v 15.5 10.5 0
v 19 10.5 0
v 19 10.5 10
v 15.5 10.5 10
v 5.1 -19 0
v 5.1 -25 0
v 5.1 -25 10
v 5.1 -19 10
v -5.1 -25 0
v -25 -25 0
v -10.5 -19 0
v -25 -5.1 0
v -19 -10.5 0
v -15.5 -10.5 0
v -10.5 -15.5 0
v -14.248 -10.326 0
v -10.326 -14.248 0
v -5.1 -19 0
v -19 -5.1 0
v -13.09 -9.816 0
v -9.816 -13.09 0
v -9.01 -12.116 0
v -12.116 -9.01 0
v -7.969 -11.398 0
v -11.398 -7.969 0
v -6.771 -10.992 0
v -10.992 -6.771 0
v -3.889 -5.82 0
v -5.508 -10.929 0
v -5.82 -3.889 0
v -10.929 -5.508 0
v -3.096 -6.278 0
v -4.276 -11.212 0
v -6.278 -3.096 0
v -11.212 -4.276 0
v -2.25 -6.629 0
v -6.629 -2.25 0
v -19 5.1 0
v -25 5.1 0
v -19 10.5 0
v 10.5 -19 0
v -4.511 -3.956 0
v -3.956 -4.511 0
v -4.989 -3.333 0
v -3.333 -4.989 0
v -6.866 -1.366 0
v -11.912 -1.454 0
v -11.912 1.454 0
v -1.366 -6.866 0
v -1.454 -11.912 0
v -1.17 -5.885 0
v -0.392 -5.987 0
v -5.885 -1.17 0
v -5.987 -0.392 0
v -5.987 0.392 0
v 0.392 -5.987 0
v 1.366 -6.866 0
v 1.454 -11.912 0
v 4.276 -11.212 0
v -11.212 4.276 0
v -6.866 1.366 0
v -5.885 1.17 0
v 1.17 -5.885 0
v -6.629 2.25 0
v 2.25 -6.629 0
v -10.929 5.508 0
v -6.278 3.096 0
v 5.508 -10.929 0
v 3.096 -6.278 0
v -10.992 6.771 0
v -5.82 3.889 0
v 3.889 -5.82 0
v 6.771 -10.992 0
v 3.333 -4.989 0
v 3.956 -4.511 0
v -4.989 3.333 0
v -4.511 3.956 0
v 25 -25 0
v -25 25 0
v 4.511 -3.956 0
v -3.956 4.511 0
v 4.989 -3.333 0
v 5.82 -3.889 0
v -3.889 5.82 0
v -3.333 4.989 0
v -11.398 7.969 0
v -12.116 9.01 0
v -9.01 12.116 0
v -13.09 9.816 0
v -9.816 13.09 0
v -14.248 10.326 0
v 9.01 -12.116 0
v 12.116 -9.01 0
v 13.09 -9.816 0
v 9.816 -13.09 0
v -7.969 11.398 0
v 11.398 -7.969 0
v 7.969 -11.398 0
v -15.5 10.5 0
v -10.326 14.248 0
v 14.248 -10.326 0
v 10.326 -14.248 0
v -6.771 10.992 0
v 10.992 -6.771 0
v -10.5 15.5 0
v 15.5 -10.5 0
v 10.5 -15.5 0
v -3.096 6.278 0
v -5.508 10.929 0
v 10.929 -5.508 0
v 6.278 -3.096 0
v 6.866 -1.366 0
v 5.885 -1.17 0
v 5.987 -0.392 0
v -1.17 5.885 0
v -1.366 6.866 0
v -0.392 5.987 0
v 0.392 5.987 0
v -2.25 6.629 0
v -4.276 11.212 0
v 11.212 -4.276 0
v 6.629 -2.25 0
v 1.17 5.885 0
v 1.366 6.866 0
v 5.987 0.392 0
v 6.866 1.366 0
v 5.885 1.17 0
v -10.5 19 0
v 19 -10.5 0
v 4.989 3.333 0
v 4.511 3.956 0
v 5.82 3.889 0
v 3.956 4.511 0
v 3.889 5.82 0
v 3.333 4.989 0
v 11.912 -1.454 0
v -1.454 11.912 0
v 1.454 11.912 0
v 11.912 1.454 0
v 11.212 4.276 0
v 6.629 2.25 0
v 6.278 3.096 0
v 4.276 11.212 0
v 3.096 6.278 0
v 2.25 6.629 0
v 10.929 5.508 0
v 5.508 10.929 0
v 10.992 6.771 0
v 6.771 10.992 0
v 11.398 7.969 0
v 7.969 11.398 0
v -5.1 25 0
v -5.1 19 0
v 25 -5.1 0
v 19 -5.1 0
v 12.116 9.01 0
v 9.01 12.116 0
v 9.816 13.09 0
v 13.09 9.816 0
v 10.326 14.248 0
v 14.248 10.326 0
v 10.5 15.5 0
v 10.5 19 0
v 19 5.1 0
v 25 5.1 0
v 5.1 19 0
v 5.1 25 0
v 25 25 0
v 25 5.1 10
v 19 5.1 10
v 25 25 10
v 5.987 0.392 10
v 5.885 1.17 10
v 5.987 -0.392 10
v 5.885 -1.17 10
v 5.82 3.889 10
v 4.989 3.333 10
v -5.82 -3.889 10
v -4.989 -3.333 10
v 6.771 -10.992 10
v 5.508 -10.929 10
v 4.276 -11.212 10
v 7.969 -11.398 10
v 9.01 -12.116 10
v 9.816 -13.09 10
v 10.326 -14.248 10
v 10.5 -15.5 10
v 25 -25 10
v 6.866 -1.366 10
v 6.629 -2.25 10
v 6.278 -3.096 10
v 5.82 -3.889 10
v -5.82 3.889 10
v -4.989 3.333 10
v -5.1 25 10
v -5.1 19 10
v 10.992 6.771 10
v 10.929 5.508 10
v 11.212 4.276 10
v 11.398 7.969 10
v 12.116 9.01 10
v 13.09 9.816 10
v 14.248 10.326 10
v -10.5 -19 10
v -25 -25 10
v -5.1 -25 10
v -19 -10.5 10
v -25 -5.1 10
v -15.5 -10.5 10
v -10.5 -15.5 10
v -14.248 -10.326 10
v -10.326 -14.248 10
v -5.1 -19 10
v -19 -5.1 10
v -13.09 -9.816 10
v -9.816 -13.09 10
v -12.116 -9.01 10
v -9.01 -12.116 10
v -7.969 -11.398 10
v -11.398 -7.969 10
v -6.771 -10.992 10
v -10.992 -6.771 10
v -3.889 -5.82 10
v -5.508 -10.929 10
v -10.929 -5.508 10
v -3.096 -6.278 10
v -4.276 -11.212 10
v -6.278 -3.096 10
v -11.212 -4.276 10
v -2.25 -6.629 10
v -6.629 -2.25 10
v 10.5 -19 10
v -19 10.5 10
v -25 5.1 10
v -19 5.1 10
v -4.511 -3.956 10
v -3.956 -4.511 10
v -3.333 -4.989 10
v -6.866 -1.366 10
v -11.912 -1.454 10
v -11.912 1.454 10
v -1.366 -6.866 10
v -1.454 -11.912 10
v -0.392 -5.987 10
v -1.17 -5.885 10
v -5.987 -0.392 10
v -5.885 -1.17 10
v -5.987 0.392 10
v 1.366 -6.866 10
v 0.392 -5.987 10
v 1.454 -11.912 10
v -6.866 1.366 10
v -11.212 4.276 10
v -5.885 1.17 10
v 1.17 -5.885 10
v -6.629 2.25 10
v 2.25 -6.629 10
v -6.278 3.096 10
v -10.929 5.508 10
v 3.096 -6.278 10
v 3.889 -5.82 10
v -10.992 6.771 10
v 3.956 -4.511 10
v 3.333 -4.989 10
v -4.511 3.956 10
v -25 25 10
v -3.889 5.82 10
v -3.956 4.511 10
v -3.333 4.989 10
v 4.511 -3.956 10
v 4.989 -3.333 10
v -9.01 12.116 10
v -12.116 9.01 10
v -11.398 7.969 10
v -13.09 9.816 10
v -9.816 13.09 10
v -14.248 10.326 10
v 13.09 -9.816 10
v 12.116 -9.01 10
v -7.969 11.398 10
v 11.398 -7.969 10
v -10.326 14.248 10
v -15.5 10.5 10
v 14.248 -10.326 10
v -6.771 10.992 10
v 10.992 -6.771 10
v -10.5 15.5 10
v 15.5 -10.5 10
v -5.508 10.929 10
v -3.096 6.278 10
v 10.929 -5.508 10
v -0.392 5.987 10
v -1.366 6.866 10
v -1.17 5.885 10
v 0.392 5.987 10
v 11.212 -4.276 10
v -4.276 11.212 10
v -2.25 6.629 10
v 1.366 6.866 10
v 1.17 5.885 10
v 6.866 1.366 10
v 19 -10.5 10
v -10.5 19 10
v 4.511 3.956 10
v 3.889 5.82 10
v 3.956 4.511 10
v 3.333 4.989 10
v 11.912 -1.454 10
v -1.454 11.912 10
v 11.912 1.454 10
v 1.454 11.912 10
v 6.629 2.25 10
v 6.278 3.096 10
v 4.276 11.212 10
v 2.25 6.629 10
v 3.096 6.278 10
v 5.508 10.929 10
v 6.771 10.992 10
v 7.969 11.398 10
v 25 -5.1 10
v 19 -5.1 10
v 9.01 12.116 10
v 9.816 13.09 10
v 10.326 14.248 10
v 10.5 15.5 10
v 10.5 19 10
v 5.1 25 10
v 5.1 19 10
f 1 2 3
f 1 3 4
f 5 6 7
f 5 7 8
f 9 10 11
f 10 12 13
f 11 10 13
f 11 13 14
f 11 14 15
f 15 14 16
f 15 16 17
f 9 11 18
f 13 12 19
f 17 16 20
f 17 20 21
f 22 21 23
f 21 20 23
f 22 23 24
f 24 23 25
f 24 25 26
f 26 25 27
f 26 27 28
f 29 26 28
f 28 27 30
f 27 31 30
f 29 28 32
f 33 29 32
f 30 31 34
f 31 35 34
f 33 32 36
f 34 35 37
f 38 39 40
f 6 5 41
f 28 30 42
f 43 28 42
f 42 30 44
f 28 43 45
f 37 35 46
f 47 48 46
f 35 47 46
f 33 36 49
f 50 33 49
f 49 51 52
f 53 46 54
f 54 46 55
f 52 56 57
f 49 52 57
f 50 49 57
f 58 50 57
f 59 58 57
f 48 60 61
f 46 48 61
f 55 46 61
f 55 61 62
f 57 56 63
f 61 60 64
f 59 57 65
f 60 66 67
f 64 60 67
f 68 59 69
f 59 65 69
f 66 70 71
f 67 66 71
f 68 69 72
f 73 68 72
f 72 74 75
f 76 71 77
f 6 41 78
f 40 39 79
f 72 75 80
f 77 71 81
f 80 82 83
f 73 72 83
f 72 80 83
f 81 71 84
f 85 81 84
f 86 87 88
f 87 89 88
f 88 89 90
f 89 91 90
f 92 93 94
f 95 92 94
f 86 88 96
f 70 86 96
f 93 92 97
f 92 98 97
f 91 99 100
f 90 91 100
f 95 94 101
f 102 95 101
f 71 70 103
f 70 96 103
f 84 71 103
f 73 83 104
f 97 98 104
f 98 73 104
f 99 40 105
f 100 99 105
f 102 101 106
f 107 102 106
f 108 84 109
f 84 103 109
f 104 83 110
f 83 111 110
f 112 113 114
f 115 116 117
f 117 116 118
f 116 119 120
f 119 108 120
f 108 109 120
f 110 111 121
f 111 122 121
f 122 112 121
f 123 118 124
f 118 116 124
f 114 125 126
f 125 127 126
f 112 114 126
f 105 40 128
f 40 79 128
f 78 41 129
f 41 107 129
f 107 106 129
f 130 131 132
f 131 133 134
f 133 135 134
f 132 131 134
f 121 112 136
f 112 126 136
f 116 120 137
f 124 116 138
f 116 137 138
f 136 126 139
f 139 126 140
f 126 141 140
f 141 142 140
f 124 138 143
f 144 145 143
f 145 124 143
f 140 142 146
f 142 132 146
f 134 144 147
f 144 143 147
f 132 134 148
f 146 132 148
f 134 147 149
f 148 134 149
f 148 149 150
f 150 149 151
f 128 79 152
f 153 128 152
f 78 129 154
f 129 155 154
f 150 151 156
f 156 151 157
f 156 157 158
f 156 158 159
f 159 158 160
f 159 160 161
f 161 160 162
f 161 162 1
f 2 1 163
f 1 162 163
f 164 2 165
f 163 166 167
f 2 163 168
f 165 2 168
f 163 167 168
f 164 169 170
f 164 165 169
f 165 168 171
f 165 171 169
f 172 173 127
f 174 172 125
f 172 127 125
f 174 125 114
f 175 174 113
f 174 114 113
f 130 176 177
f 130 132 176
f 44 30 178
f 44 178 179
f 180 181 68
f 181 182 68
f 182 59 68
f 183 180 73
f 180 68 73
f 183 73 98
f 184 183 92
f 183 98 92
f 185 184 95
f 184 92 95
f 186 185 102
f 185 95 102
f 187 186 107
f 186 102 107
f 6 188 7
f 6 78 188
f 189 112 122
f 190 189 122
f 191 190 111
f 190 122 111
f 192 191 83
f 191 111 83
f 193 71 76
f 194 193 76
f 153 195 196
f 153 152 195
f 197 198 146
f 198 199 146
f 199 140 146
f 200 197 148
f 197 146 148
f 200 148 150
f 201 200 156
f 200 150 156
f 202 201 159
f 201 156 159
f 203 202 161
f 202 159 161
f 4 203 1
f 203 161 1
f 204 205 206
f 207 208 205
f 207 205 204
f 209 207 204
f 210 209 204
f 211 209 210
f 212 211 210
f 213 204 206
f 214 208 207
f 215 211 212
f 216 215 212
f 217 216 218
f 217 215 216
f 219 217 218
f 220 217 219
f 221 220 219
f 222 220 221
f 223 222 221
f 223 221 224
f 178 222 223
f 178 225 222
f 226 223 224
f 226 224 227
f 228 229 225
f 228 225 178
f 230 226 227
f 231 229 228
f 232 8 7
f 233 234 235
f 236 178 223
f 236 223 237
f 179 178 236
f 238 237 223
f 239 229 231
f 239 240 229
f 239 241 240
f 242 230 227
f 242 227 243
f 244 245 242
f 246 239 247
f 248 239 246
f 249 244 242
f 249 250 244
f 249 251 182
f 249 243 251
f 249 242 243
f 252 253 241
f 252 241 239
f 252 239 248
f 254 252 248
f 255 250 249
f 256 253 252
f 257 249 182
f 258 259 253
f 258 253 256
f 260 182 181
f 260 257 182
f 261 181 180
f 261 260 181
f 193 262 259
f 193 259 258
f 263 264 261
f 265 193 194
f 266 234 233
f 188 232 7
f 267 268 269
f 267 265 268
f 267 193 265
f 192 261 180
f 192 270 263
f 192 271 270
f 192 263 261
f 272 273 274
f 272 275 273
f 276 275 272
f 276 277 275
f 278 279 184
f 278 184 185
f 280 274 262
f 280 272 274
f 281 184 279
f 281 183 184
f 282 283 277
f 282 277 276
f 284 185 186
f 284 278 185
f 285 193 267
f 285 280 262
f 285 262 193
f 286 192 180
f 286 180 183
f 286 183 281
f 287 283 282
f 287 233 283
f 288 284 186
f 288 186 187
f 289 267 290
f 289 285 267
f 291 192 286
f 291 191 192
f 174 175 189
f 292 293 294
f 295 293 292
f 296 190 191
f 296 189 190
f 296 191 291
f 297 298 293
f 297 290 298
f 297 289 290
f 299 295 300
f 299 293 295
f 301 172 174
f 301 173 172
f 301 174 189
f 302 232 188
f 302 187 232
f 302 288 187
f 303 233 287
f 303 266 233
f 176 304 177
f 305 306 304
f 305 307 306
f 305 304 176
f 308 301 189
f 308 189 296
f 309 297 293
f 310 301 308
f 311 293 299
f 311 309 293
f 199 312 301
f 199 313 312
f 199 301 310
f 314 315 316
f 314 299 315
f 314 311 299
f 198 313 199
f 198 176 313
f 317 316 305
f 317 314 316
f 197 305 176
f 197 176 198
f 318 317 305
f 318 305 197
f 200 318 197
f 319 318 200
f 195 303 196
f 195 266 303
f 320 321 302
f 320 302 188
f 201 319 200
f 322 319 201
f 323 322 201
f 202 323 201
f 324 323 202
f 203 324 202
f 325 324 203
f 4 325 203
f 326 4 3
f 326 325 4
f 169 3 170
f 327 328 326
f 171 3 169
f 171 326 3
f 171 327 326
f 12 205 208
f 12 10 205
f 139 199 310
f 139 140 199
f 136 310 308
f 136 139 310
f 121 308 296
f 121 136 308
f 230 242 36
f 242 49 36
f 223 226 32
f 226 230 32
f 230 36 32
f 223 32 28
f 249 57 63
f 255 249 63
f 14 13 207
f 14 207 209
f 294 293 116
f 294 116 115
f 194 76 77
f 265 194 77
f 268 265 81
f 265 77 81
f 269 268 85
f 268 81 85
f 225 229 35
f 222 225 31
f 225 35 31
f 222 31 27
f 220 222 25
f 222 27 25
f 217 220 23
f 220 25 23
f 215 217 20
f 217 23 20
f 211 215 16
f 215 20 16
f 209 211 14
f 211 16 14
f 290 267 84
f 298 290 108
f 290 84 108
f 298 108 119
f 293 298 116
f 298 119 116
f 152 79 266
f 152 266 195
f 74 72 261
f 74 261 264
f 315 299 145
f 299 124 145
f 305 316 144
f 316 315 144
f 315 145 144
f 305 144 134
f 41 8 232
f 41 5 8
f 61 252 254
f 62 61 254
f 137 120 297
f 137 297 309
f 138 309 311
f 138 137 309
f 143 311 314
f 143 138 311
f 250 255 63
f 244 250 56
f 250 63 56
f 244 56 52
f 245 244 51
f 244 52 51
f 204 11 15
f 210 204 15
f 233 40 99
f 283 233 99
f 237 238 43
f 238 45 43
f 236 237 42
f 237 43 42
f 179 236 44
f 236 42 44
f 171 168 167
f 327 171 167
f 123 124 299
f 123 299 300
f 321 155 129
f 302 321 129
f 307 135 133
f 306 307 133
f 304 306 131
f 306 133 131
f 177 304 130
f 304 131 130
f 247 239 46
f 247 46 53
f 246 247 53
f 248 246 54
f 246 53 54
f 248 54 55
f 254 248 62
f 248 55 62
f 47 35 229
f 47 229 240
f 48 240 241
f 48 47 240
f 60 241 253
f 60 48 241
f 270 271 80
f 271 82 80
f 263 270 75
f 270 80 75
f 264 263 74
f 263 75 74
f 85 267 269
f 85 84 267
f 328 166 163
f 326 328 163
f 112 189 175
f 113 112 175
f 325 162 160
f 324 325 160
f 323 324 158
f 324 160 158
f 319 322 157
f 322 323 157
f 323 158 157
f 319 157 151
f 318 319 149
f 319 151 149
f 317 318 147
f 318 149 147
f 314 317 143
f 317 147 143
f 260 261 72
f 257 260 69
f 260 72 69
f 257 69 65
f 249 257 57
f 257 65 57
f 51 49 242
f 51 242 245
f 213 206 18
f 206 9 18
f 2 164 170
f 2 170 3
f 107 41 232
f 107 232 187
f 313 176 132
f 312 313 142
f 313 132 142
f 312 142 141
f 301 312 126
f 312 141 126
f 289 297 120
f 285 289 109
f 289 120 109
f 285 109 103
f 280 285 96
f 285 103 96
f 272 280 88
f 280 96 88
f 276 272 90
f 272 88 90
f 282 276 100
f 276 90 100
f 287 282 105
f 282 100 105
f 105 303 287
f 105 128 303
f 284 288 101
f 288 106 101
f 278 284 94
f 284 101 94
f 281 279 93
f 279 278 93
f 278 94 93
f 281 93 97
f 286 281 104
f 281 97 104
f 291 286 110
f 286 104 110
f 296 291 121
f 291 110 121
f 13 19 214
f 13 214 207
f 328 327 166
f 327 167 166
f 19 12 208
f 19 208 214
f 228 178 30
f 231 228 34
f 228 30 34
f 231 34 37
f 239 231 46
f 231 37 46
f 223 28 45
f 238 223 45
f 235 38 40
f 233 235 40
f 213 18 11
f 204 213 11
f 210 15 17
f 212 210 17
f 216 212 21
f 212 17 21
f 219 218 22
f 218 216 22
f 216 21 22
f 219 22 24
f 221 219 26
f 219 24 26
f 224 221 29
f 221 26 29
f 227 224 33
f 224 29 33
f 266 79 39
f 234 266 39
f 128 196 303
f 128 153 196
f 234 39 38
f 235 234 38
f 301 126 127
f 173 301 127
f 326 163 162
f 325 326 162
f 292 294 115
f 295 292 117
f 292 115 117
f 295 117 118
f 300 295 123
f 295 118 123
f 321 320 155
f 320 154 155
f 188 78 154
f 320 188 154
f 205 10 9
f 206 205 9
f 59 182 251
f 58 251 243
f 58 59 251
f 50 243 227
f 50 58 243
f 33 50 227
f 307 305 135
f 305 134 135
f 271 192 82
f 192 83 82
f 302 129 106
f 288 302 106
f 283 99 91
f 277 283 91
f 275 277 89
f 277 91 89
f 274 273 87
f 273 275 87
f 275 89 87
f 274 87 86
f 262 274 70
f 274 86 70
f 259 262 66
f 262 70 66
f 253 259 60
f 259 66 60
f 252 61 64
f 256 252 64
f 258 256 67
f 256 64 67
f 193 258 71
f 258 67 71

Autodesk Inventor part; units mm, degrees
ref_plane "YZ Plane" through (0, 0, 0) normal (1, 0, 0) x (0, 1, 0)
ref_plane "XZ Plane" through (0, 0, 0) normal (0, 1, 0) x (-1, 0, 0)
ref_plane "XY Plane" through (0, 0, 0) normal (0, 0, 1) x (1, 0, 0)
sketch "Sketch2" plane through (0, 0, 0) normal (0, 0, 1) x (1, 0, 0)
  line L0 (0, 0) -> (0, 6) construction
  circle A0 centre (0, 0) radius 6 construction
  circle A1 centre (0, 0) radius 7 construction
  arc A2 (1.1705, 5.8847) -> (-1.1705, 5.8847) centre (0, 0) ccw
  line L1 (-1.3656, 6.8655) -> (0, 0) construction
  line L2 (-1.3656, 6.8655) -> (-1.1705, 5.8847)
  arc A3 (-1.3656, 6.8655) -> (-3.889, 5.8203) centre (0, 0) ccw
  line L3 (0, 0) -> (-3.889, 5.8203) construction
  line L4 (-3.889, 5.8203) -> (-3.3334, 4.9888)
  line L5 (-6.8655, 1.3656) -> (-5.8847, 1.1705)
  arc A4 (-5.8203, 3.889) -> (-6.8655, 1.3656) centre (0, 0) ccw
  line L6 (-5.8203, 3.889) -> (-4.9888, 3.3334)
  arc A5 (-3.3334, 4.9888) -> (-4.9888, 3.3334) centre (0, 0) ccw
  line L7 (-5.8203, -3.889) -> (-4.9888, -3.3334)
  arc A6 (-6.8655, -1.3656) -> (-5.8203, -3.889) centre (0, 0) ccw
  line L8 (-6.8655, -1.3656) -> (-5.8847, -1.1705)
  arc A7 (-5.8847, 1.1705) -> (-5.8847, -1.1705) centre (0, 0) ccw
  line L9 (-1.3656, -6.8655) -> (-1.1705, -5.8847)
  arc A8 (-3.889, -5.8203) -> (-1.3656, -6.8655) centre (0, 0) ccw
  line L10 (-3.889, -5.8203) -> (-3.3334, -4.9888)
  arc A9 (-4.9888, -3.3334) -> (-3.3334, -4.9888) centre (0, 0) ccw
  line L11 (3.889, -5.8203) -> (3.3334, -4.9888)
  arc A10 (1.3656, -6.8655) -> (3.889, -5.8203) centre (0, 0) ccw
  line L12 (1.3656, -6.8655) -> (1.1705, -5.8847)
  arc A11 (-1.1705, -5.8847) -> (1.1705, -5.8847) centre (0, 0) ccw
  line L13 (6.8655, -1.3656) -> (5.8847, -1.1705)
  arc A12 (5.8203, -3.889) -> (6.8655, -1.3656) centre (0, 0) ccw
  line L14 (5.8203, -3.889) -> (4.9888, -3.3334)
  arc A13 (3.3334, -4.9888) -> (4.9888, -3.3334) centre (0, 0) ccw
  line L15 (5.8203, 3.889) -> (4.9888, 3.3334)
  arc A14 (6.8655, 1.3656) -> (5.8203, 3.889) centre (0, 0) ccw
  line L16 (6.8655, 1.3656) -> (5.8847, 1.1705)
  arc A15 (5.8847, -1.1705) -> (5.8847, 1.1705) centre (0, 0) ccw
  line L17 (1.3656, 6.8655) -> (1.1705, 5.8847)
  arc A16 (3.889, 5.8203) -> (1.3656, 6.8655) centre (0, 0) ccw
  line L18 (3.889, 5.8203) -> (3.3334, 4.9888)
  arc A17 (4.9888, 3.3334) -> (3.3334, 4.9888) centre (0, 0) ccw
  circle A18 centre (0, 0) radius 12
  line L19 (-20.9, 20.9) -> (-14.1, 20.9) construction
  line L20 (-14.1, 20.9) -> (-14.1, 14.1) construction
  line L21 (-14.1, 14.1) -> (-20.9, 14.1) construction
  line L22 (-20.9, 14.1) -> (-20.9, 20.9) construction
  line L23 (-20.9, 20.9) -> (-14.1, 14.1) construction
  line L24 (-14.1, 20.9) -> (-20.9, 14.1) construction
  line L25 (-21.5, 13.5) -> (-13.5, 13.5) construction
  line L26 (-13.5, 13.5) -> (-13.5, 21.5) construction
  line L27 (-13.5, 21.5) -> (-21.5, 21.5) construction
  line L28 (-21.5, 21.5) -> (-21.5, 13.5) construction
  line L29 (-21.5, 13.5) -> (-13.5, 21.5) construction
  line L30 (-13.5, 13.5) -> (-21.5, 21.5) construction
  line L31 (-19, 20.9) -> (-16, 20.9)
  line L32 (-19, 20.9) -> (-19, 21.5)
  line L33 (-25, 25) -> (-25, 5.1)
  line L34 (-25, 25) -> (-5.1, 25)
  line L35 (-25, 5.1) -> (-19, 5.1)
  line L36 (-19, 5.1) -> (-19, 10.5)
  line L37 (-19, 10.5) -> (-12, 10.5) construction
  line L38 (-12, 0) -> (-12, 10.5) construction
  arc A19 (-11.2123, 4.276) -> (-15.5, 10.5) centre (-15.5, 5.9111) ccw
  line L39 (-19, 10.5) -> (-15.5, 10.5)
  line L40 (-5.1, 25) -> (-5.1, 19)
  line L41 (-5.1, 19) -> (-10.5, 19)
  line L42 (-10.5, 19) -> (-10.5, 15.5)
  arc A20 (-10.5, 15.5) -> (-4.276, 11.2123) centre (-5.9111, 15.5) ccw
  point P0 (-4.2426, 4.2426)
  point P1 (-6, 0)
  point P2 (-4.2426, -4.2426)
  point P3 (0, -6)
  point P4 (4.2426, -4.2426)
  point P5 (6, 0)
  point P6 (4.2426, 4.2426)
  point P7 (-5.8847, 1.1705)
  point P8 (-3.3334, 4.9888)
  point P9 (1.1705, 5.8847)
  point P10 (4.9888, 3.3334)
  point P11 (-1.1705, -5.8847)
  point P12 (-4.9888, -3.3334)
  point P13 (-17.5, 17.5)
  point P14 (-17.5, 20.9)
  dimension "d1" = 14
  dimension "d2" = 12
  dimension "d7" = 360
  dimension "d10" = 22.5
  dimension "d11" = 24
  dimension "d14" = 17.5
  dimension "d15" = 17.5
  dimension "d16" = 6.8
  dimension "d17" = 8
  dimension "d18" = 3
  dimension "d19" = 25
  dimension "d20" = 5.1
  dimension "d21" = 25
  dimension "d22" = 6
  dimension "d23" = 3
extrude "Extrusion1" add sketch "Sketch2" along normal blind 10 contours A18
extrude "Extrusion2" add sketch "Sketch2" along normal blind 10 contours A18 A19 L39 L36 L35 L33 L34 L40 L41 L42 A20
pattern_circular "Circular Pattern2" count 4 over 360 about axis through (0, 0, 0) along (0, 0, 1) of "Extrusion2"
equation "\"d15\" = d14"
equation "\"d21\" = d19"
properties part number "Perfil-de-aluminio-0001-002" material "Aluminum 6061"
